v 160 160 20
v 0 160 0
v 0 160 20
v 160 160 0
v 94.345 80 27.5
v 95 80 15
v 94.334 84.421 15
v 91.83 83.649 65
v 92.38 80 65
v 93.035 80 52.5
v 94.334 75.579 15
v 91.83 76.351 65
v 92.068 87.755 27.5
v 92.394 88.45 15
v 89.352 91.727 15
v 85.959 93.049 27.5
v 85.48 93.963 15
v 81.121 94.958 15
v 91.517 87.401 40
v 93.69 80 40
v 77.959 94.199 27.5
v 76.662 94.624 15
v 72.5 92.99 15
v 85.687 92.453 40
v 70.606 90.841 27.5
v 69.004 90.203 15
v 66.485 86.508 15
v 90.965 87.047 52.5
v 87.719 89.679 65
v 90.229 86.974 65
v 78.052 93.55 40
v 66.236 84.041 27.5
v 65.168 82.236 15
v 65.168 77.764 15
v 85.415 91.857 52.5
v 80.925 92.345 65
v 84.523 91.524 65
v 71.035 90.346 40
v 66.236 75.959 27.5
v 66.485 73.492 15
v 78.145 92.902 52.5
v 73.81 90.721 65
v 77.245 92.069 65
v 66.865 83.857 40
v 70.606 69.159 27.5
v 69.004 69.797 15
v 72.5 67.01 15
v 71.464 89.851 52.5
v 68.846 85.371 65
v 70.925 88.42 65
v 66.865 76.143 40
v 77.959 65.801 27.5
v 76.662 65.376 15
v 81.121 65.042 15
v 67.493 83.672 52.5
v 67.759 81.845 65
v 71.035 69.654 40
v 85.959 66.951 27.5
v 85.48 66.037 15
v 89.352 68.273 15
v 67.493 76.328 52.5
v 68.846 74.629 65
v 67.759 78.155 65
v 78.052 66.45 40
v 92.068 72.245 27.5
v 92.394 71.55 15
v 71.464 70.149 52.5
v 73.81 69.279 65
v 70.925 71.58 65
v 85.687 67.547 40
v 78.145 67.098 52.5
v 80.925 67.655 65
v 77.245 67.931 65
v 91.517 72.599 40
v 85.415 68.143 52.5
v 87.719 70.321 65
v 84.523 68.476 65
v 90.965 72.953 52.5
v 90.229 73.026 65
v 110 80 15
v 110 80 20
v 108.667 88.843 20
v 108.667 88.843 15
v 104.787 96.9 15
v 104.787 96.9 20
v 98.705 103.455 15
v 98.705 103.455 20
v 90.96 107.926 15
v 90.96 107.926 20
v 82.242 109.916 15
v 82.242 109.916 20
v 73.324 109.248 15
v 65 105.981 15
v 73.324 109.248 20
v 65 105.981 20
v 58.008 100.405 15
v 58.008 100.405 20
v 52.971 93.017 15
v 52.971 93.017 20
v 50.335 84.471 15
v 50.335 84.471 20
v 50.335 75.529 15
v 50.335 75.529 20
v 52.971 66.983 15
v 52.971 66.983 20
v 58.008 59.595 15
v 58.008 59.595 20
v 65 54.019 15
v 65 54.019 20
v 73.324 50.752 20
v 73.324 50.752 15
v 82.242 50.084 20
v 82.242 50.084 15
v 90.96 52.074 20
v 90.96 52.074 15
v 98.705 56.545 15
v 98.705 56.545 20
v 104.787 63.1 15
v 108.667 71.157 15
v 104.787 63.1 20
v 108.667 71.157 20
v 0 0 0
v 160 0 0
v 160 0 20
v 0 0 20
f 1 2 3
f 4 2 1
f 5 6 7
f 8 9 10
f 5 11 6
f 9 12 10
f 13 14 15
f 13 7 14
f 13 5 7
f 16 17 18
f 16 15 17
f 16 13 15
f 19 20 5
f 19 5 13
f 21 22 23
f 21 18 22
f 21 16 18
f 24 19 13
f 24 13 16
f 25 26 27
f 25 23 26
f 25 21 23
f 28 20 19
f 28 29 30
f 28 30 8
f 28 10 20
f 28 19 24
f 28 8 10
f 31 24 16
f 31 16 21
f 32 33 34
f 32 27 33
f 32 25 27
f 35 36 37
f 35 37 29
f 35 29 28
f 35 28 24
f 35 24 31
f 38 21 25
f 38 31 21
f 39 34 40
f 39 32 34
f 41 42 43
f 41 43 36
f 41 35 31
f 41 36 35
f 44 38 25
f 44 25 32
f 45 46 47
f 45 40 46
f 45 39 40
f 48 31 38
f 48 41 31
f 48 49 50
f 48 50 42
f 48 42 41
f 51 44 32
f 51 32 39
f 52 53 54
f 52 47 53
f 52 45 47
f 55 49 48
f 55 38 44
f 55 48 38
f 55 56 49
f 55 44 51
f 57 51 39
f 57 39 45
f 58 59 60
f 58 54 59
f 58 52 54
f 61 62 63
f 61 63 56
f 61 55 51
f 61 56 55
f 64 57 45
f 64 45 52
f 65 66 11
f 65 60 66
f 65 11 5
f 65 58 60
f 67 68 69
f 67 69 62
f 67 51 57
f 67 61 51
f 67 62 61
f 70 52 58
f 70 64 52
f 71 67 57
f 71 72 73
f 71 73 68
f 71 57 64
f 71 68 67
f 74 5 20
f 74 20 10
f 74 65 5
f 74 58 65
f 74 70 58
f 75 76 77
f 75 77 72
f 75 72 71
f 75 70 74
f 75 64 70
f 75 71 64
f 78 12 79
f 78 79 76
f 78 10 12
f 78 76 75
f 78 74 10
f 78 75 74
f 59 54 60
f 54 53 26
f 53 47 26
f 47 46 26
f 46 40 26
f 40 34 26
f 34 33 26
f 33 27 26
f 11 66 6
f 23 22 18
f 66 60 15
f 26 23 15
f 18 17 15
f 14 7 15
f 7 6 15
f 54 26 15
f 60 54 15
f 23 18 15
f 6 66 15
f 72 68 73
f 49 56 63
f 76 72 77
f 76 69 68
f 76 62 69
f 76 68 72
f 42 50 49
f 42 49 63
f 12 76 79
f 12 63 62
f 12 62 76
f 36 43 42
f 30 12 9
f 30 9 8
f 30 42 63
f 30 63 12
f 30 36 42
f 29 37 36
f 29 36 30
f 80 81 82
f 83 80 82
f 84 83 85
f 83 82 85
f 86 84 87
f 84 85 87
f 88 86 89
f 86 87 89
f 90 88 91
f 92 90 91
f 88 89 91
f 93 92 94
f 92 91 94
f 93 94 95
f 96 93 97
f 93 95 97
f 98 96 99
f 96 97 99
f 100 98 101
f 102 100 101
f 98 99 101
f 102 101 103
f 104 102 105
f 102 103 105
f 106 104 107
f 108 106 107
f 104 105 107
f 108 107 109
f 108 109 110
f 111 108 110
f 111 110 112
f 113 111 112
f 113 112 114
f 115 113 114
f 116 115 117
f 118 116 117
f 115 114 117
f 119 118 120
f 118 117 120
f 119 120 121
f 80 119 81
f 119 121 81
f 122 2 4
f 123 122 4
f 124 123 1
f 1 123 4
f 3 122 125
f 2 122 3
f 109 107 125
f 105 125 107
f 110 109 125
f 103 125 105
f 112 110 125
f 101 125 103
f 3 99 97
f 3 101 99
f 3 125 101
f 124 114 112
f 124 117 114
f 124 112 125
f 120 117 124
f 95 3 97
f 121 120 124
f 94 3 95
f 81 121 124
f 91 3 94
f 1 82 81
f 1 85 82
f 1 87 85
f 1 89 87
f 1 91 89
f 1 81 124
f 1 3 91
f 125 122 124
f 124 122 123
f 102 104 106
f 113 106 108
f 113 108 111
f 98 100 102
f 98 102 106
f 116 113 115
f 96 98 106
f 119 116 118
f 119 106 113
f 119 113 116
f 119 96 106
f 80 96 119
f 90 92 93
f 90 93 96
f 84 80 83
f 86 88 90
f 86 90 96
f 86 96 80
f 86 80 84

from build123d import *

# Parameters (mm, degrees)
F0_W     = 160
F0_H     = 160
F1_DEPTH = 20
F2_R     = 30
F3_DEPTH = 5
F4_R     = 15
F5_DEPTH = 50
F5_TAPER = 3


with BuildPart() as f1:
    # F0 (on Top) → F1 (new body)
    with BuildSketch(Plane.XY):
        with Locations((80, 80)):
            Rectangle(F0_W, F0_H)
    extrude(amount=F1_DEPTH)

    # F2 (on face) → F3 (cut)
    with BuildSketch(Plane.XY.offset(20)):
        with Locations((80, 80)):
            Circle(F2_R)
    extrude(amount=-F3_DEPTH, mode=Mode.SUBTRACT)


with BuildPart() as f5:
    # F4 (on face) → F5 (new body)
    with BuildSketch(Plane.XY.offset(15)):
        with Locations((80, 80)):
            Circle(F4_R)
    extrude(amount=F5_DEPTH, taper=F5_TAPER)


solid = Compound([f1.part, f5.part])
